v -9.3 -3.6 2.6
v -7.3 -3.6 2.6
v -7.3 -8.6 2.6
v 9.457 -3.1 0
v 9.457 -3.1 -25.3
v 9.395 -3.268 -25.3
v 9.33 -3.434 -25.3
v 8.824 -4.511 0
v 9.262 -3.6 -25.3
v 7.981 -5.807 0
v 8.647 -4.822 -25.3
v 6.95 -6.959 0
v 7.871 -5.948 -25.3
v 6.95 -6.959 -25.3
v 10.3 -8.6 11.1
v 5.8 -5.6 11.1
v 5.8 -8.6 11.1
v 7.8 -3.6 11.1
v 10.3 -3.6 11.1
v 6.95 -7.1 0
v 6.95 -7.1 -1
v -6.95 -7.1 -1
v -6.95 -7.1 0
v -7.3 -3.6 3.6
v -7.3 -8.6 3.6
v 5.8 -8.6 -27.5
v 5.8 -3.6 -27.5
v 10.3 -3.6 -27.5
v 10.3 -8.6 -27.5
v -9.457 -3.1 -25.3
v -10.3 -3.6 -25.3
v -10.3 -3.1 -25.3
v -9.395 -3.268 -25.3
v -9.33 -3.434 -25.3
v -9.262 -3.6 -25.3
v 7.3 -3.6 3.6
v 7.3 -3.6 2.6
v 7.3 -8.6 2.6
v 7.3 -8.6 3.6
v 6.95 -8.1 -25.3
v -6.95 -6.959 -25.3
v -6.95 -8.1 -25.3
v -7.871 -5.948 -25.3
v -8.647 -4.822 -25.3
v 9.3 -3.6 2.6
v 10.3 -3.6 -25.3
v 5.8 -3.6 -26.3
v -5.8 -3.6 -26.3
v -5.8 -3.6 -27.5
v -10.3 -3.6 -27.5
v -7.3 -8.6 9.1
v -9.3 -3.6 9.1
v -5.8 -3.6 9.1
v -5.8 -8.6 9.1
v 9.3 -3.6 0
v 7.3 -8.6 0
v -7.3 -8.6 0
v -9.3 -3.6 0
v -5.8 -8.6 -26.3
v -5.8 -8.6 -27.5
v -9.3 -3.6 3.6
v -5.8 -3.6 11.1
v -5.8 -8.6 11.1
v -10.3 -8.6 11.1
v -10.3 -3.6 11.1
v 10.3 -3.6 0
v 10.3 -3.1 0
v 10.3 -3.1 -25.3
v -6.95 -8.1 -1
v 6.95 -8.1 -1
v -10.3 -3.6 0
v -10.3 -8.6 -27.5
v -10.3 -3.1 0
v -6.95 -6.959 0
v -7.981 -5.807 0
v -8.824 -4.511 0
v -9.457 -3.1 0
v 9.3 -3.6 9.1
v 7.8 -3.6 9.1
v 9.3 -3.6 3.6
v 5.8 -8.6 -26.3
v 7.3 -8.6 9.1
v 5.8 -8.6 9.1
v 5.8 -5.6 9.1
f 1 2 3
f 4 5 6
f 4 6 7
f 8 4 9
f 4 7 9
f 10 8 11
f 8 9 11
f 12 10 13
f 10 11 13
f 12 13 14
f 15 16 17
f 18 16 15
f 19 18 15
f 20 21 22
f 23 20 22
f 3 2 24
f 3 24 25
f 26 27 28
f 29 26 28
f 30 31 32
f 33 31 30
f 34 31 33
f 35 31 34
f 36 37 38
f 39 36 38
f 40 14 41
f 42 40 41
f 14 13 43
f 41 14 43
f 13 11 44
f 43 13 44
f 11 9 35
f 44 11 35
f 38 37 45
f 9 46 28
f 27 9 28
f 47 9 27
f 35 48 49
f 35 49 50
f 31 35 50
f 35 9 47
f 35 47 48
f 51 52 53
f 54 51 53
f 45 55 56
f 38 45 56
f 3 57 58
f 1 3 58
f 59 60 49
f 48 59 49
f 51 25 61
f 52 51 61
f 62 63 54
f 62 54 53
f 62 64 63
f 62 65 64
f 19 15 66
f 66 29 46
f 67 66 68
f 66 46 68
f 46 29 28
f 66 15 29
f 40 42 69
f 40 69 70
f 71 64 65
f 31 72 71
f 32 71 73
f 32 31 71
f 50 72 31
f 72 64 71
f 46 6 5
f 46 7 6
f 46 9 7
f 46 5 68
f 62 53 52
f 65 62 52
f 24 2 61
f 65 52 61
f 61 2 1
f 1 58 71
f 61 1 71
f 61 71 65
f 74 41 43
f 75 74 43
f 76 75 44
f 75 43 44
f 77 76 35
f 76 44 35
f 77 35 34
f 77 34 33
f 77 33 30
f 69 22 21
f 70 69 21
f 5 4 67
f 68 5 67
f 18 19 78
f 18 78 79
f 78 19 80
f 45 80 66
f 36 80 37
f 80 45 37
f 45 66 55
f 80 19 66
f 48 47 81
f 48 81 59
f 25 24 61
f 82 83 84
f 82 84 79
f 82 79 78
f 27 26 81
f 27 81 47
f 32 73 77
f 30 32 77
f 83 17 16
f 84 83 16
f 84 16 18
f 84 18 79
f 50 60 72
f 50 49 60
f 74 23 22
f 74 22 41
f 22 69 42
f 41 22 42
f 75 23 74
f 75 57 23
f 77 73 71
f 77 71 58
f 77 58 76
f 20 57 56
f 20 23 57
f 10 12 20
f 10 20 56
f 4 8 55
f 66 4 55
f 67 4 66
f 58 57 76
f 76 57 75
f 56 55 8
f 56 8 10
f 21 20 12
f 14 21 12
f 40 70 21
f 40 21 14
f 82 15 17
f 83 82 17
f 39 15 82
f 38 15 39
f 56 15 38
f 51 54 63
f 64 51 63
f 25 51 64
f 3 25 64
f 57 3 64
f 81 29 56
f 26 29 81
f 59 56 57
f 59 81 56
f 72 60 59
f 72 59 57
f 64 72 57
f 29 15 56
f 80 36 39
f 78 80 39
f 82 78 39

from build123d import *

# Parameters (mm, degrees)
SKETCH1_W           = 20.6
SKETCH1_H           = 17.2
BOSS_EXTRUDE1_DEPTH = 2.5
SKETCH2_W           = 20.6
SKETCH2_H           = 1.5
BOSS_EXTRUDE2_DEPTH = 25.3
SKETCH3_W           = 20.6
SKETCH3_H           = 5
BOSS_EXTRUDE3_DEPTH = 1
SKETCH4_W           = 3.35
SKETCH4_H           = 25.3
BOSS_EXTRUDE4_DEPTH = 4
CUT_EXTRUDE2_START  = 25.3
CUT_EXTRUDE2_DEPTH  = 25.3
CHAMFER1_SIZE       = 2
BOSS_EXTRUDE5_DEPTH = 1.2
SKETCH7_W           = 4.5
SKETCH7_H           = 5
BOSS_EXTRUDE6_DEPTH = 1.5
SKETCH8_R           = 16.793205084
CUT_EXTRUDE3_DEPTH  = 2.5
BOSS_EXTRUDE7_DEPTH = 11.1
BOSS_EXTRUDE8_DEPTH = 1
SKETCH11_W          = 4.5
SKETCH11_H          = 5
BOSS_EXTRUDE9_DEPTH = 2
CHAMFER2_SIZE       = 2
SKETCH12_W          = 13.9
SKETCH12_H          = 24.3
CUT_EXTRUDE4_DEPTH  = 1


with BuildPart() as part:
    # Sketch1 → Boss-Extrude1 (new body)
    with BuildSketch(Plane.XY):
        Rectangle(SKETCH1_W, SKETCH1_H)
        with BuildLine():
            Line((3.1, 2.3), (3.1, -2))
            ThreePointArc((3.1, -2), (0, -5.1), (-3.1, -2))
            Line((-3.1, -2), (-3.1, 2.3))
            ThreePointArc((-3.1, 2.3), (0, 5.4), (3.1, 2.3))
        make_face(mode=Mode.SUBTRACT)
    extrude(amount=BOSS_EXTRUDE1_DEPTH)

    # Sketch2 → Boss-Extrude2 (add)
    with BuildSketch(Plane(origin=(0, 0, 0), x_dir=(-1, 0, 0), z_dir=(0, 0, -1))):
        with Locations((0, -7.85)):
            Rectangle(SKETCH2_W, SKETCH2_H)
    extrude(amount=BOSS_EXTRUDE2_DEPTH)

    # Sketch3 → Boss-Extrude3 (add)
    with BuildSketch(Plane(origin=(0, 0, -25.3), x_dir=(-1, 0, 0), z_dir=(0, 0, -1))):
        with Locations((0, -6.1)):
            Rectangle(SKETCH3_W, SKETCH3_H)
    extrude(amount=BOSS_EXTRUDE3_DEPTH)

    # Sketch4 → Boss-Extrude4 (add)
    with BuildSketch(Plane(origin=(0, -7.1, 0), x_dir=(1, 0, 0), z_dir=(0, 1, 0))):
        with Locations((-8.625, 12.65)):
            Rectangle(SKETCH4_W, SKETCH4_H)
        with Locations((8.625, 12.65)):
            Rectangle(SKETCH4_W, SKETCH4_H)
    extrude(amount=BOSS_EXTRUDE4_DEPTH)

    # Sketch5 → Cut-Extrude2 (cut)
    # profile 1 of 3: a face of its own
    with BuildSketch(Plane(origin=(0, 0, 0), x_dir=(-1, 0, 0), z_dir=(0, 0, -1)).offset(CUT_EXTRUDE2_START)):
        with BuildLine():
            Line((-6.800183821, -7.1), (6.800183821, -7.1))
            ThreePointArc((6.800183821, -7.1), (6.87545093, -7.030121044), (6.95, -6.959476565))
            Line((6.95, -6.959476565), (6.95, -3.1))
            Line((6.95, -3.1), (9.457404507, -3.1))
            ThreePointArc((9.457404507, -3.1), (9.900742783, -1.425628104), (10.05, 0.3))
            ThreePointArc((10.05, 0.3), (8.886892922, 4.993147579), (5.666789214, 8.6))
            Line((5.666789214, 8.6), (-5.666789214, 8.6))
            ThreePointArc((-5.666789214, 8.6), (-9.560743116, 3.397529834), (-9.457404507, -3.1))
            Line((-9.457404507, -3.1), (-6.95, -3.1))
            Line((-6.95, -3.1), (-6.95, -6.959476565))
            ThreePointArc((-6.95, -6.959476565), (-6.87545093, -7.030121044), (-6.800183821, -7.1))
        make_face()
        with BuildLine():
            ThreePointArc((3.1, -2), (0, -5.1), (-3.1, -2))
            Line((-3.1, -2), (-3.1, 2.3))
            ThreePointArc((-3.1, 2.3), (0, 5.4), (3.1, 2.3))
            Line((3.1, 2.3), (3.1, -2))
        make_face(mode=Mode.SUBTRACT)
    # profile 2 of 3: a face of its own
    with BuildSketch(Plane(origin=(0, 0, 0), x_dir=(-1, 0, 0), z_dir=(0, 0, -1)).offset(CUT_EXTRUDE2_START)):
        with BuildLine():
            Line((6.95, -3.1), (6.95, -6.959476565))
            ThreePointArc((6.95, -6.959476565), (8.427610604, -5.175205887), (9.457404507, -3.1))
            Line((9.457404507, -3.1), (6.95, -3.1))
        make_face()
    # profile 3 of 3: a face of its own
    with BuildSketch(Plane(origin=(0, 0, 0), x_dir=(-1, 0, 0), z_dir=(0, 0, -1)).offset(CUT_EXTRUDE2_START)):
        with BuildLine():
            ThreePointArc((-9.457404507, -3.1), (-8.427610604, -5.175205887), (-6.95, -6.959476565))
            Line((-6.95, -6.959476565), (-6.95, -3.1))
            Line((-6.95, -3.1), (-9.457404507, -3.1))
        make_face()
    extrude(amount=-CUT_EXTRUDE2_DEPTH, mode=Mode.SUBTRACT)

    # Chamfer1
    chamfer1_edges = [part.edges().sort_by_distance(p)[0] for p in [
        (-10.3, 8.6, 1.25),
        (10.3, 8.6, 1.25),
    ]]
    chamfer(chamfer1_edges, length=CHAMFER1_SIZE)

    # Sketch6 → Boss-Extrude5 (add)
    with BuildSketch(Plane(origin=(0, 0, -26.3), x_dir=(-1, 0, 0), z_dir=(0, 0, -1))):
        Polygon((-7.3, -8.6), (-10.3, -8.6), (-10.3, -3.6), (-9.3, -3.6), align=None)
        Polygon((9.3, -3.6), (7.3, -8.6), (10.3, -8.6), (10.3, -3.6), align=None)
    extrude(amount=BOSS_EXTRUDE5_DEPTH)

    # Sketch7 → Boss-Extrude6 (add)
    with BuildSketch(Plane(origin=(0, 0, -27.5), x_dir=(-1, 0, 0), z_dir=(0, 0, -1))):
        with Locations((-8.05, -6.1)):
            Rectangle(SKETCH7_W, SKETCH7_H)
        with Locations((8.05, -6.1)):
            Rectangle(SKETCH7_W, SKETCH7_H)
    extrude(amount=-BOSS_EXTRUDE6_DEPTH)

    # Sketch8 → Cut-Extrude3 (cut)
    with BuildSketch(Plane.XY.offset(2.5)):
        Circle(SKETCH8_R)
    extrude(amount=-CUT_EXTRUDE3_DEPTH, mode=Mode.SUBTRACT)

    # Sketch9 → Boss-Extrude7 (add)
    with BuildSketch(Plane.XY):
        Polygon((7.3, -8.6), (10.3, -8.6), (10.3, -3.6), (9.3, -3.6), align=None)
        Polygon((-10.3, -8.6), (-7.3, -8.6), (-9.3, -3.6), (-10.3, -3.6), align=None)
    extrude(amount=BOSS_EXTRUDE7_DEPTH)

    # Sketch10 → Boss-Extrude8 (add)
    with BuildSketch(Plane.XY.offset(2.6)):
        Polygon((-9.3, -3.6), (-7.3, -3.6), (-7.3, -8.6), (-10.3, -8.6), (-10.3, -3.6), align=None)
        Polygon((9.3, -3.6), (7.3, -3.6), (7.3, -8.6), (10.3, -8.6), (10.3, -3.6), align=None)
    extrude(amount=BOSS_EXTRUDE8_DEPTH)

    # Sketch11 → Boss-Extrude9 (add)
    with BuildSketch(Plane.XY.offset(11.1)):
        with Locations((-8.05, -6.1)):
            Rectangle(SKETCH11_W, SKETCH11_H)
        with Locations((8.05, -6.1)):
            Rectangle(SKETCH11_W, SKETCH11_H)
    extrude(amount=-BOSS_EXTRUDE9_DEPTH)

    # Chamfer2
    chamfer2_edges = [part.edges().sort_by_distance(p)[0] for p in [
        (5.8, -3.6, 10.1),
    ]]
    chamfer(chamfer2_edges, length=CHAMFER2_SIZE)

    # Sketch12 → Cut-Extrude4 (cut)
    with BuildSketch(Plane(origin=(0, -7.1, 0), x_dir=(1, 0, 0), z_dir=(0, 1, 0))):
        with Locations((0, 13.15)):
            Rectangle(SKETCH12_W, SKETCH12_H)
    extrude(amount=-CUT_EXTRUDE4_DEPTH, mode=Mode.SUBTRACT)


solid = part.part
